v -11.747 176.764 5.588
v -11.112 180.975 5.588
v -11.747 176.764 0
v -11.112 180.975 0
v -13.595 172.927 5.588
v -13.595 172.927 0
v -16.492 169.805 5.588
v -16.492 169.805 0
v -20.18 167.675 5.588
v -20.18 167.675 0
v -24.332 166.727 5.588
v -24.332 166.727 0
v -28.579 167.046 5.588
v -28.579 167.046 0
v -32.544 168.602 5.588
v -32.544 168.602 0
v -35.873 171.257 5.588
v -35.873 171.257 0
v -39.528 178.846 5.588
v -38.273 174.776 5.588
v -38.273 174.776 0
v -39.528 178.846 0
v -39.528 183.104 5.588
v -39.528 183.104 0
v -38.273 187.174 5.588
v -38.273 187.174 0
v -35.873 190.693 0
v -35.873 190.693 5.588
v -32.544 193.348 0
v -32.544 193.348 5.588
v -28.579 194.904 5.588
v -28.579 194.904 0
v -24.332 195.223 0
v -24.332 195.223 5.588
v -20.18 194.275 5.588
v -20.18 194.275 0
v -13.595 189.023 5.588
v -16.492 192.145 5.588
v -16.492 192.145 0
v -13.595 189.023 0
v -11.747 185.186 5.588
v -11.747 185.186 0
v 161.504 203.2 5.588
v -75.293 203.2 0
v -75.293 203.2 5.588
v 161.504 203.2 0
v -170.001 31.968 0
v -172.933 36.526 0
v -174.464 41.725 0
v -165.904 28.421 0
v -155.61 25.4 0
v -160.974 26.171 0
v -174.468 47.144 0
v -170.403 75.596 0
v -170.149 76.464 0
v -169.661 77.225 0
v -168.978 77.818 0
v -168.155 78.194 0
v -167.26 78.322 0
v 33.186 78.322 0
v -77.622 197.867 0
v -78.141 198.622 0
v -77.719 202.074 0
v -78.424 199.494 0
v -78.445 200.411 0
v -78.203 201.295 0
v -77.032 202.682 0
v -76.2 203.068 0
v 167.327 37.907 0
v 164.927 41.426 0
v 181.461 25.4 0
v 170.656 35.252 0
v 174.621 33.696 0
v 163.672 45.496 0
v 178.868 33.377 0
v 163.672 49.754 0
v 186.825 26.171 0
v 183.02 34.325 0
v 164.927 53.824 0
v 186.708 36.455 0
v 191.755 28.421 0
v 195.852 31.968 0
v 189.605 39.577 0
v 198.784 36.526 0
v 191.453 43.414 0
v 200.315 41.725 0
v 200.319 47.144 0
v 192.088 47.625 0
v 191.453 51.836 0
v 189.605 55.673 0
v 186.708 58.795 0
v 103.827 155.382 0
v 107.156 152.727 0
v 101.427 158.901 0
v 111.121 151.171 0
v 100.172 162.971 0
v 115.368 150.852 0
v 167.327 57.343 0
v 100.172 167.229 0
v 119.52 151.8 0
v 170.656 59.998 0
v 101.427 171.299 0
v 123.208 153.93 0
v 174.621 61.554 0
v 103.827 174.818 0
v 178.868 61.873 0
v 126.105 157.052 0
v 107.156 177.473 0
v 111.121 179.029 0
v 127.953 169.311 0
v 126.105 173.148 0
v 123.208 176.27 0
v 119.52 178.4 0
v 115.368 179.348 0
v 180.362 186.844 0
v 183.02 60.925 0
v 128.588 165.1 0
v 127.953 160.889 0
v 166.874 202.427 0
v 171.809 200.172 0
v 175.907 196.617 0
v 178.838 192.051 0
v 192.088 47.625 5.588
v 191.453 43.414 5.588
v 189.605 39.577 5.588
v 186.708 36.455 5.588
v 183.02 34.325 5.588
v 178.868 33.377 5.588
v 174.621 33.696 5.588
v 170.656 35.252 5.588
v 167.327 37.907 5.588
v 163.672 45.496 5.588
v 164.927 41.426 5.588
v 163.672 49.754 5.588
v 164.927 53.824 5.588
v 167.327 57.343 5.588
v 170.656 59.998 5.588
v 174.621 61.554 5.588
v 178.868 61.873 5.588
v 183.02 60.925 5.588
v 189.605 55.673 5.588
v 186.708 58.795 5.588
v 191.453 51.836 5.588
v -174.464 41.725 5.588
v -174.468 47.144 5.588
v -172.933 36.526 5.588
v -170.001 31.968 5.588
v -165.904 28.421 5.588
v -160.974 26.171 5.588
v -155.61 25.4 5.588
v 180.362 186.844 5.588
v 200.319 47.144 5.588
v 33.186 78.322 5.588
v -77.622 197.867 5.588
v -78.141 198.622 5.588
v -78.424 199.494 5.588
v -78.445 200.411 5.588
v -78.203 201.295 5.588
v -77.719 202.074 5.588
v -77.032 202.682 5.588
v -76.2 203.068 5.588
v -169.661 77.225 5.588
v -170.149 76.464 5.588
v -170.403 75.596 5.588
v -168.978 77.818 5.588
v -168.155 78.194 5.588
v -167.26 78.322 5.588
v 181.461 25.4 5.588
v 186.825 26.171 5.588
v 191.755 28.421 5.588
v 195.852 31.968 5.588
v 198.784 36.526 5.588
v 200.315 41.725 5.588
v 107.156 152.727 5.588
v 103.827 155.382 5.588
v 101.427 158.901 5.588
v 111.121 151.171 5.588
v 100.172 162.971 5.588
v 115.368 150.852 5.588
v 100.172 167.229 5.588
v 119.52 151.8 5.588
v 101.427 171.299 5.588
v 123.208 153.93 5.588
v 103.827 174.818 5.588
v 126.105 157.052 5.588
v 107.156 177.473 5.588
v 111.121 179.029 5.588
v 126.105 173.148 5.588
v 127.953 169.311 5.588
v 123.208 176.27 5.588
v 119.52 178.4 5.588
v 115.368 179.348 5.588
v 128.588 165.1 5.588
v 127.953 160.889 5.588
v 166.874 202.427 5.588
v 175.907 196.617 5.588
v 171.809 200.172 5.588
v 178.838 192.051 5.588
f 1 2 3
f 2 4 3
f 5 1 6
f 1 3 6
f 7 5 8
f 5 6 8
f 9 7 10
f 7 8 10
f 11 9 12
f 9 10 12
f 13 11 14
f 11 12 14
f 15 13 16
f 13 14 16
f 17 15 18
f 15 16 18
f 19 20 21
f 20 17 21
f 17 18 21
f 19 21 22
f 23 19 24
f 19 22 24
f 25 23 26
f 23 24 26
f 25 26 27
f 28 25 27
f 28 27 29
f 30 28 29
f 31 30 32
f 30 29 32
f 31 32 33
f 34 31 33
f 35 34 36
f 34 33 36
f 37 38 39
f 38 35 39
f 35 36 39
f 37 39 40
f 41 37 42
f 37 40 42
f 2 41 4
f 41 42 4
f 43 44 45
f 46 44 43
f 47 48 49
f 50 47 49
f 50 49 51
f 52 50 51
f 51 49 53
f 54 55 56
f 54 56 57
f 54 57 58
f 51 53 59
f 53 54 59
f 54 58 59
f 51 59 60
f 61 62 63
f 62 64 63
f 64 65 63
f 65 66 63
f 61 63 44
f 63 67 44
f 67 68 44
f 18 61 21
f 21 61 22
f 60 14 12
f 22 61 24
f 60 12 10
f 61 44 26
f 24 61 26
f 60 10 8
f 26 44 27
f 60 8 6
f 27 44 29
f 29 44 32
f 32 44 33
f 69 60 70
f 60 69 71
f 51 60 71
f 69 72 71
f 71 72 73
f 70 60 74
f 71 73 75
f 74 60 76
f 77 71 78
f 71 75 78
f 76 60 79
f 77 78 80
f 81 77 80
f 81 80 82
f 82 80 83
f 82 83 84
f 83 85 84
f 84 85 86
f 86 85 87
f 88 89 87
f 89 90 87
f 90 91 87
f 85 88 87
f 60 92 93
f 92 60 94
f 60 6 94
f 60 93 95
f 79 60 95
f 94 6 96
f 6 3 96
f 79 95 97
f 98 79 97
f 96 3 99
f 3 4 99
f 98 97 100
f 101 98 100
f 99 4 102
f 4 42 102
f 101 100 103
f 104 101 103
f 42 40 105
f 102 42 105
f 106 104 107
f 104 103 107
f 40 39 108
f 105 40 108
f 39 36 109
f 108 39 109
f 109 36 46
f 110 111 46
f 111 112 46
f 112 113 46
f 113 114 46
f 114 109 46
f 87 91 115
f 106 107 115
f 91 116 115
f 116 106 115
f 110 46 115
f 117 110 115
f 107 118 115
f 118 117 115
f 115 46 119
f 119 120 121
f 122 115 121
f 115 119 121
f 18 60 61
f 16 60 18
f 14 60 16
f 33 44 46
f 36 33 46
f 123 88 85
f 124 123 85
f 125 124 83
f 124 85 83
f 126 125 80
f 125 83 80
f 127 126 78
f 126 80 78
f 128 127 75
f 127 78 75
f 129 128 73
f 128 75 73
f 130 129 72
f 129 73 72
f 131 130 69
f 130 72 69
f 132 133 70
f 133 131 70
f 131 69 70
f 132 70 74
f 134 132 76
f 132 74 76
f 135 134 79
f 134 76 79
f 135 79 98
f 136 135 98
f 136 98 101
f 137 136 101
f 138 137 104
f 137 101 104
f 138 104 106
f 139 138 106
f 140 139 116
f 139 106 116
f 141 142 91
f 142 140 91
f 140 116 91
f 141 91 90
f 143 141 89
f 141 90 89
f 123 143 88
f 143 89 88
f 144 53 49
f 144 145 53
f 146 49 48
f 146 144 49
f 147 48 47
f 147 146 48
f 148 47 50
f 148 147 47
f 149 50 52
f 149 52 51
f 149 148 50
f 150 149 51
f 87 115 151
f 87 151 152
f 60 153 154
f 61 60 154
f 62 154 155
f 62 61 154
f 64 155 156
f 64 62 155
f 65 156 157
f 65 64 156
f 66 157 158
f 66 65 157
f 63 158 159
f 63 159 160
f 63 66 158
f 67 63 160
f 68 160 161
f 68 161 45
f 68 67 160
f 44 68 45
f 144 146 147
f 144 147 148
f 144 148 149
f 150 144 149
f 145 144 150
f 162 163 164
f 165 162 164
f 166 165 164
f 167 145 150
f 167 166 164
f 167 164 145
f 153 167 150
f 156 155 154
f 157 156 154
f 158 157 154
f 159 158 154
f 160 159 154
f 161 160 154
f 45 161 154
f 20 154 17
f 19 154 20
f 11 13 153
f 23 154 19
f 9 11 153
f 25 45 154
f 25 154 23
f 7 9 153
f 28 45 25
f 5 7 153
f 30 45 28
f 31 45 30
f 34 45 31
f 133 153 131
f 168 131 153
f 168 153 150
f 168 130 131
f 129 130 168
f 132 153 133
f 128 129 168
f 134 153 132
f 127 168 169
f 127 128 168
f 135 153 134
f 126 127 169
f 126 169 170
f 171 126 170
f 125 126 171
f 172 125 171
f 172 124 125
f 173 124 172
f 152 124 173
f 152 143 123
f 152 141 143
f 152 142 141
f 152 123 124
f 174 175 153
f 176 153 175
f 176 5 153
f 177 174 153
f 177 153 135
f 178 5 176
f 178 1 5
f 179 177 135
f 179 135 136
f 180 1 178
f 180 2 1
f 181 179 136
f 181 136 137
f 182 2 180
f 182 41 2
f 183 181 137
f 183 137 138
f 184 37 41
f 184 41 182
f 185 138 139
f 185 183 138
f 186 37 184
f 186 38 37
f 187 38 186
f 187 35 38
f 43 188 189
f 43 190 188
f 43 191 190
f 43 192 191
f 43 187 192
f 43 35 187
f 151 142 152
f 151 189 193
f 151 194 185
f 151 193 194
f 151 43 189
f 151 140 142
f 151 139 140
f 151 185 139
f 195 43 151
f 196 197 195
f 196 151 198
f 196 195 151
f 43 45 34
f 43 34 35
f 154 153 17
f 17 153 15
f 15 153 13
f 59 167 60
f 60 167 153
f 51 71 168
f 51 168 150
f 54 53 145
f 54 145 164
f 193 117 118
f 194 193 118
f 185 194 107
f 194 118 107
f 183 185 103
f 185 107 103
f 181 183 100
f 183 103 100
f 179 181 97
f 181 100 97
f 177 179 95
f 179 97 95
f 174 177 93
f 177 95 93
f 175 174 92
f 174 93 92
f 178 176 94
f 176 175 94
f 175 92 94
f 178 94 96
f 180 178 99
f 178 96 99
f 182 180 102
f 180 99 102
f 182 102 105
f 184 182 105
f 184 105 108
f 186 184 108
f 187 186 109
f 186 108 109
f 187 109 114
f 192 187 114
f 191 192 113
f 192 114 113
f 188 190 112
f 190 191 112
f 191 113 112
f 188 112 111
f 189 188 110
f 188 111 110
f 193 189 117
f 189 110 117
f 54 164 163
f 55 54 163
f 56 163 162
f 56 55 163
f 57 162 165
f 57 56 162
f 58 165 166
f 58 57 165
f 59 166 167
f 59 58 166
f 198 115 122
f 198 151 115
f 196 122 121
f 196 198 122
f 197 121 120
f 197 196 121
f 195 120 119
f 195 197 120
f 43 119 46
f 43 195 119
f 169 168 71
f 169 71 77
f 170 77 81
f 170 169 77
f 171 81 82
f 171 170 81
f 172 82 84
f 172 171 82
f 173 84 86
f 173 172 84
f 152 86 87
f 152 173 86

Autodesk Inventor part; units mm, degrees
ref_plane "YZ Plane" through (0, 0, 0) normal (1, 0, 0) x (0, 1, 0)
ref_plane "XZ Plane" through (0, 0, 0) normal (0, 1, 0) x (-1, 0, 0)
ref_plane "XY Plane" through (0, 0, 0) normal (0, 0, 1) x (1, 0, 0)
sketch "Sketch1" plane through (0, 0, 0) normal (0, 0, 1) x (1, 0, 0)
  line L0 (-177.5744, 25.4) -> (-152.1744, 203.2)
  line L1 (-152.1744, 203.2) -> (178.0256, 203.2)
  line L2 (178.0256, 203.2) -> (203.4256, 25.4)
  line L3 (203.4256, 25.4) -> (-177.5744, 25.4)
  circle A0 centre (114.3, 165.1) radius 14.2875
  circle A1 centre (-25.4, 180.975) radius 14.2875
  circle A2 centre (177.8, 47.625) radius 14.2875
  circle A3 centre (505.2413, 166.6875) radius 88.9 construction
  line L4 (-713.704, 0) -> (0, 0) construction
  line L5 (0, 0) -> (0, -152.4) construction
  line L6 (0, -152.4) -> (-713.704, -152.4) construction
  line L7 (-713.704, -152.4) -> (-713.704, 0) construction
  circle A4 centre (177.8, 47.625) radius 50.8 construction
  line L8 (0, -152.4) -> (745.4464, -152.4) construction
  dimension "d0" = 28.575
  dimension "d1" = 22.225
  dimension "d2" = 22.225
  dimension "d7" = 177.8
  dimension "d8" = 152.4
  dimension "d9" = 101.6
  dimension "d11" = 177.8
  dimension "d12" = 25.4
  dimension "d13" = 177.8
  dimension "d14" = 22.225
  dimension "d15" = 203.2
  dimension "d16" = 38.1
  dimension "d17" = 63.5
  dimension "d18" = 381
  dimension "d19" = 330.2
extrude "Extrusion1" add sketch "Sketch1" along normal blind 5.588
fillet "Fillet1" radius 19.05 4 edges at (203.4256, 25.4, 2.794) (178.0256, 203.2, 2.794) (-152.1744, 203.2, 2.794) (-177.5744, 25.4, 2.794)
sketch "Sketch2" plane through (0, 0, 5.588) normal (0, 0, 1) x (1, 0, 0)
  line L0 (-154.5109, 186.8441) -> (-174.4681, 47.1441) projected
  line L1 (-170.014, 78.3223) -> (33.186, 78.3223)
  line L2 (33.186, 78.3223) -> (-82.5653, 203.2)
  line L3 (161.5037, 203.2) -> (-135.6524, 203.2) projected
  line L4 (-82.5653, 203.2) -> (-152.1744, 203.2)
  line L5 (-152.1744, 203.2) -> (-170.014, 78.3223)
  point P0 (0, 0)
  dimension "d23" = 203.2
extrude "Extrusion2" cut sketch "Sketch2" against normal through all
fillet "Fillet2" radius 3.175 2 edges at (-170.014, 78.3223, 2.794) (-82.5653, 203.2, 2.794)
properties part number "2021 Intake Panels" material "Polycarbonate, Clear"
